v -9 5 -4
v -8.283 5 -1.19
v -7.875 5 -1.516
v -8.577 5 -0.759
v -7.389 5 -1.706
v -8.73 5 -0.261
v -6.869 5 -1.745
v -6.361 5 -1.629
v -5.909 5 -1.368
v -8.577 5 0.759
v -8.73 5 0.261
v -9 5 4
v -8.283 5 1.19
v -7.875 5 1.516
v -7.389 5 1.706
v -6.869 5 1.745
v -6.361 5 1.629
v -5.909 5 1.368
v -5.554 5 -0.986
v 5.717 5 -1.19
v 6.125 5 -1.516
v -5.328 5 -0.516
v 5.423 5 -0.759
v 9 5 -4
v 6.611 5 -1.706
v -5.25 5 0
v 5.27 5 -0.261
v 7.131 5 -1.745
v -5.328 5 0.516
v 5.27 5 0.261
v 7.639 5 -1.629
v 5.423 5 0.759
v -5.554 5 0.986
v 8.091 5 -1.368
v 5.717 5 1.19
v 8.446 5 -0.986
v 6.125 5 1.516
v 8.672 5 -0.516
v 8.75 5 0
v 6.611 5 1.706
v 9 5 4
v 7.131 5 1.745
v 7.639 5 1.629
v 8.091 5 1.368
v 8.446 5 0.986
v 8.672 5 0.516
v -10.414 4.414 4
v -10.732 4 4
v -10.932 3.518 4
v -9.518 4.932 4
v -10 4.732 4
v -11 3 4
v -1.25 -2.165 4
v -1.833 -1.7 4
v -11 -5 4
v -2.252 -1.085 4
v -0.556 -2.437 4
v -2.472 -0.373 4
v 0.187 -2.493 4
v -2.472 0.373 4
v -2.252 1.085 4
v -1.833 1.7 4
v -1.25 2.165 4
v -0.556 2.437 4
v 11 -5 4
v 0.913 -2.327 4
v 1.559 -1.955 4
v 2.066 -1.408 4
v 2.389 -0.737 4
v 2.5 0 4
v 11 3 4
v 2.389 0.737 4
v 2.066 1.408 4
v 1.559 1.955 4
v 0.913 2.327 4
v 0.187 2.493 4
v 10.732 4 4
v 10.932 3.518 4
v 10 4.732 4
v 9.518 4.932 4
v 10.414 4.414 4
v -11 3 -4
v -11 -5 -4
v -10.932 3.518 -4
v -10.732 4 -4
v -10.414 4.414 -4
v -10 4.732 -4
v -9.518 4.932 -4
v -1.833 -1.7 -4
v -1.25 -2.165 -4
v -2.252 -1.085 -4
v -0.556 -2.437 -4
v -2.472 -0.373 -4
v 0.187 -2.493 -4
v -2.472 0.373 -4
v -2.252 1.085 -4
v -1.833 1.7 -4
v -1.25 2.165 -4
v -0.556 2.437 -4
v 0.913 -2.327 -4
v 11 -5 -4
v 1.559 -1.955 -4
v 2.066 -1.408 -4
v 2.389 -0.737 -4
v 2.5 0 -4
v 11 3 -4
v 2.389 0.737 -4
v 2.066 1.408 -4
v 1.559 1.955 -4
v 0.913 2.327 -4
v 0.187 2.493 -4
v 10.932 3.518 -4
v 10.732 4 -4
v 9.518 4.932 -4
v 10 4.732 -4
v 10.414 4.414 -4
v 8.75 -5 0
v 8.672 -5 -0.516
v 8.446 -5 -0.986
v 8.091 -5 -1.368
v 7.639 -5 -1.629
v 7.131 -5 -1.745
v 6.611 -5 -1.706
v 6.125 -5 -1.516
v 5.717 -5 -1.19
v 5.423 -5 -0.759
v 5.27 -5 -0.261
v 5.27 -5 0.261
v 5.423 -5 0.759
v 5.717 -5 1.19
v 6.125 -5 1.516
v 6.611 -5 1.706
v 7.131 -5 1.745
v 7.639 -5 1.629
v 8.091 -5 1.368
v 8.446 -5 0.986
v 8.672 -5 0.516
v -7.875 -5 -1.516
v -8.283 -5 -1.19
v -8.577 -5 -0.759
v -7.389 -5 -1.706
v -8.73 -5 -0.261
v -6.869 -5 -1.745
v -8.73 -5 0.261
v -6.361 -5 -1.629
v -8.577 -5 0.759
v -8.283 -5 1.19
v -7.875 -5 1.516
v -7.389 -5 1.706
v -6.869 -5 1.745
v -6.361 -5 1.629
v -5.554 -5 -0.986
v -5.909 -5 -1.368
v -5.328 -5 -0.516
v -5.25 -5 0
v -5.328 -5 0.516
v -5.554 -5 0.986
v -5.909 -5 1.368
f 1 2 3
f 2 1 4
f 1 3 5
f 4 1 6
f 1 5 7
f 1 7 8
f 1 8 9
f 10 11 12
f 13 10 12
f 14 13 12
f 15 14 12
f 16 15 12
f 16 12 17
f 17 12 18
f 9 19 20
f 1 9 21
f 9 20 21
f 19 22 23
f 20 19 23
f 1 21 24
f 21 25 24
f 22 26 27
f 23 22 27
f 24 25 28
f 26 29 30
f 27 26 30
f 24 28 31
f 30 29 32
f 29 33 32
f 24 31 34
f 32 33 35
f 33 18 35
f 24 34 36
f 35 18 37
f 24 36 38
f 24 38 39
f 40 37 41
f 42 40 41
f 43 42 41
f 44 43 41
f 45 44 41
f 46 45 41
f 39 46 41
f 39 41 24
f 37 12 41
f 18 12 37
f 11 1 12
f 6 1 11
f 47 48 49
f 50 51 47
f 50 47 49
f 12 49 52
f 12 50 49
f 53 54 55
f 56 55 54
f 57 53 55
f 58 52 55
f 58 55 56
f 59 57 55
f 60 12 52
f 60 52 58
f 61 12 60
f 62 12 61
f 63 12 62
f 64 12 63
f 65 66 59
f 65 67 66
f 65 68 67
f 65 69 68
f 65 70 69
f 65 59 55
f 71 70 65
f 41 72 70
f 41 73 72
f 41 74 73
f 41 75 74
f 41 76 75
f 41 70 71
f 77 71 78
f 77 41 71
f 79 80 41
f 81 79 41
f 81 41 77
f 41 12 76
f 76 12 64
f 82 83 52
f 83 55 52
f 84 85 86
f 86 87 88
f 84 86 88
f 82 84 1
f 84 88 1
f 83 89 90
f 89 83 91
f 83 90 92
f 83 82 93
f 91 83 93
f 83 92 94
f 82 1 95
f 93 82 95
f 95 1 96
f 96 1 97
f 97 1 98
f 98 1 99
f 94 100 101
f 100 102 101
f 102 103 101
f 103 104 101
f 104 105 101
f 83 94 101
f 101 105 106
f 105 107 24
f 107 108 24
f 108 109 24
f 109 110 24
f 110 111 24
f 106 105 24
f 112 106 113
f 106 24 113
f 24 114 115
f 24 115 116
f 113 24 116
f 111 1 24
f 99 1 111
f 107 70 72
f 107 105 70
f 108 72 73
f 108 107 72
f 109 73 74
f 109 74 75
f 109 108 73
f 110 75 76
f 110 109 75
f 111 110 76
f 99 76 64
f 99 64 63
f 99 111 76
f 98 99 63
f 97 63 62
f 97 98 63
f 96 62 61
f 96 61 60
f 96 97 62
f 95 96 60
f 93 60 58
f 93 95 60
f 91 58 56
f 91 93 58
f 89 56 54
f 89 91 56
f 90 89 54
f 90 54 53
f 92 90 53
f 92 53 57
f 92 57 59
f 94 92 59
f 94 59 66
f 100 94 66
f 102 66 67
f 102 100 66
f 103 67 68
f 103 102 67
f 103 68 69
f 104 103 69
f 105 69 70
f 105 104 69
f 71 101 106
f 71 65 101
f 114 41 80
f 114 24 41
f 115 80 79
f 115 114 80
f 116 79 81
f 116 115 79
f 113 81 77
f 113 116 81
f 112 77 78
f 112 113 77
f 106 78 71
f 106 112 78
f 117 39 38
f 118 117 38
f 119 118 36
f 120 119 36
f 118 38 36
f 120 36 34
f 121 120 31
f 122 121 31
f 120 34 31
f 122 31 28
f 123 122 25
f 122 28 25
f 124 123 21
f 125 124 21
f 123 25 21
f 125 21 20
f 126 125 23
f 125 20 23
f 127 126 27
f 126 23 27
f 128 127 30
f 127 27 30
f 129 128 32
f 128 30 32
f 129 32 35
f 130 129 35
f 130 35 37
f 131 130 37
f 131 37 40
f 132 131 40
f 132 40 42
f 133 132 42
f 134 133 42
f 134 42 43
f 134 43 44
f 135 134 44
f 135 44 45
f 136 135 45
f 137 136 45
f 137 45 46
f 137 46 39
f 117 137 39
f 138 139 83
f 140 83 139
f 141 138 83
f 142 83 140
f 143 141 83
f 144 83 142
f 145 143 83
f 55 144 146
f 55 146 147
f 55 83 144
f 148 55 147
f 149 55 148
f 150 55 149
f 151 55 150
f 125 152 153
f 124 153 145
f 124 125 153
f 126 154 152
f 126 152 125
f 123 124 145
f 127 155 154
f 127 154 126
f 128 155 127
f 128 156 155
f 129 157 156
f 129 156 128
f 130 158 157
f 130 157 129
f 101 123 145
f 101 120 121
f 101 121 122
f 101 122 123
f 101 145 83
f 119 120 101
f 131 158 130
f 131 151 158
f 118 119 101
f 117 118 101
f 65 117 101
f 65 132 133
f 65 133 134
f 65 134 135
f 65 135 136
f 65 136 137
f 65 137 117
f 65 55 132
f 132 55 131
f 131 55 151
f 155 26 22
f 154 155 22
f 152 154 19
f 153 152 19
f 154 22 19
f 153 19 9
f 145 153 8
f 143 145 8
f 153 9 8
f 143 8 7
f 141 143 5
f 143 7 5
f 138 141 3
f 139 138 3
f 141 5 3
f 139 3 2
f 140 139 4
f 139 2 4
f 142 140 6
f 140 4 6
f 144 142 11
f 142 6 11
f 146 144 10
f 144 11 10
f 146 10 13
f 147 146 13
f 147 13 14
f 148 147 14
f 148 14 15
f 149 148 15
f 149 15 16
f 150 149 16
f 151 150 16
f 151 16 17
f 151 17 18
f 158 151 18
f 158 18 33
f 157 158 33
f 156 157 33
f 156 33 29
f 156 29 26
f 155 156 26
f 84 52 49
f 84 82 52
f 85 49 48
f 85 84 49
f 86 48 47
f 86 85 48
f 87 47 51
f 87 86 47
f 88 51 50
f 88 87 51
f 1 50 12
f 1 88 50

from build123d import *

# Parameters (mm, degrees)
SKETCH_1_W          = 22
SKETCH_1_H          = 10
SKETCH_1_R          = 2.5
EXTRUDE_1_DEPTH     = 4
SKETCH_3_R          = 1.75
CUT_EXTRUDE_1_DEPTH = 11
FILLET_1_R          = 2


with BuildPart() as part:
    # ｽｹｯﾁ1 → ﾎﾞｽ - 押し出し1 (new body, symmetric)
    with BuildSketch(Plane.XY):
        Rectangle(SKETCH_1_W, SKETCH_1_H)
        Circle(SKETCH_1_R, mode=Mode.SUBTRACT)
    extrude(amount=EXTRUDE_1_DEPTH, both=True)

    # ｽｹｯﾁ3 → ｶｯﾄ - 押し出し1 (cut, through all)
    with BuildSketch(Plane(origin=(0, 5, 0), x_dir=(1, 0, 0), z_dir=(0, 1, 0))):
        with Locations((7, 0)):
            Circle(SKETCH_3_R)
        with Locations((-7, 0)):
            Circle(SKETCH_3_R)
    extrude(amount=-CUT_EXTRUDE_1_DEPTH, mode=Mode.SUBTRACT)

    # ﾌｨﾚｯﾄ1
    fillet_1_edges = [part.edges().sort_by_distance(p)[0] for p in [
        (-11, 5, 0),
        (11, 5, 0),
    ]]
    fillet(fillet_1_edges, radius=FILLET_1_R)


solid = part.part
